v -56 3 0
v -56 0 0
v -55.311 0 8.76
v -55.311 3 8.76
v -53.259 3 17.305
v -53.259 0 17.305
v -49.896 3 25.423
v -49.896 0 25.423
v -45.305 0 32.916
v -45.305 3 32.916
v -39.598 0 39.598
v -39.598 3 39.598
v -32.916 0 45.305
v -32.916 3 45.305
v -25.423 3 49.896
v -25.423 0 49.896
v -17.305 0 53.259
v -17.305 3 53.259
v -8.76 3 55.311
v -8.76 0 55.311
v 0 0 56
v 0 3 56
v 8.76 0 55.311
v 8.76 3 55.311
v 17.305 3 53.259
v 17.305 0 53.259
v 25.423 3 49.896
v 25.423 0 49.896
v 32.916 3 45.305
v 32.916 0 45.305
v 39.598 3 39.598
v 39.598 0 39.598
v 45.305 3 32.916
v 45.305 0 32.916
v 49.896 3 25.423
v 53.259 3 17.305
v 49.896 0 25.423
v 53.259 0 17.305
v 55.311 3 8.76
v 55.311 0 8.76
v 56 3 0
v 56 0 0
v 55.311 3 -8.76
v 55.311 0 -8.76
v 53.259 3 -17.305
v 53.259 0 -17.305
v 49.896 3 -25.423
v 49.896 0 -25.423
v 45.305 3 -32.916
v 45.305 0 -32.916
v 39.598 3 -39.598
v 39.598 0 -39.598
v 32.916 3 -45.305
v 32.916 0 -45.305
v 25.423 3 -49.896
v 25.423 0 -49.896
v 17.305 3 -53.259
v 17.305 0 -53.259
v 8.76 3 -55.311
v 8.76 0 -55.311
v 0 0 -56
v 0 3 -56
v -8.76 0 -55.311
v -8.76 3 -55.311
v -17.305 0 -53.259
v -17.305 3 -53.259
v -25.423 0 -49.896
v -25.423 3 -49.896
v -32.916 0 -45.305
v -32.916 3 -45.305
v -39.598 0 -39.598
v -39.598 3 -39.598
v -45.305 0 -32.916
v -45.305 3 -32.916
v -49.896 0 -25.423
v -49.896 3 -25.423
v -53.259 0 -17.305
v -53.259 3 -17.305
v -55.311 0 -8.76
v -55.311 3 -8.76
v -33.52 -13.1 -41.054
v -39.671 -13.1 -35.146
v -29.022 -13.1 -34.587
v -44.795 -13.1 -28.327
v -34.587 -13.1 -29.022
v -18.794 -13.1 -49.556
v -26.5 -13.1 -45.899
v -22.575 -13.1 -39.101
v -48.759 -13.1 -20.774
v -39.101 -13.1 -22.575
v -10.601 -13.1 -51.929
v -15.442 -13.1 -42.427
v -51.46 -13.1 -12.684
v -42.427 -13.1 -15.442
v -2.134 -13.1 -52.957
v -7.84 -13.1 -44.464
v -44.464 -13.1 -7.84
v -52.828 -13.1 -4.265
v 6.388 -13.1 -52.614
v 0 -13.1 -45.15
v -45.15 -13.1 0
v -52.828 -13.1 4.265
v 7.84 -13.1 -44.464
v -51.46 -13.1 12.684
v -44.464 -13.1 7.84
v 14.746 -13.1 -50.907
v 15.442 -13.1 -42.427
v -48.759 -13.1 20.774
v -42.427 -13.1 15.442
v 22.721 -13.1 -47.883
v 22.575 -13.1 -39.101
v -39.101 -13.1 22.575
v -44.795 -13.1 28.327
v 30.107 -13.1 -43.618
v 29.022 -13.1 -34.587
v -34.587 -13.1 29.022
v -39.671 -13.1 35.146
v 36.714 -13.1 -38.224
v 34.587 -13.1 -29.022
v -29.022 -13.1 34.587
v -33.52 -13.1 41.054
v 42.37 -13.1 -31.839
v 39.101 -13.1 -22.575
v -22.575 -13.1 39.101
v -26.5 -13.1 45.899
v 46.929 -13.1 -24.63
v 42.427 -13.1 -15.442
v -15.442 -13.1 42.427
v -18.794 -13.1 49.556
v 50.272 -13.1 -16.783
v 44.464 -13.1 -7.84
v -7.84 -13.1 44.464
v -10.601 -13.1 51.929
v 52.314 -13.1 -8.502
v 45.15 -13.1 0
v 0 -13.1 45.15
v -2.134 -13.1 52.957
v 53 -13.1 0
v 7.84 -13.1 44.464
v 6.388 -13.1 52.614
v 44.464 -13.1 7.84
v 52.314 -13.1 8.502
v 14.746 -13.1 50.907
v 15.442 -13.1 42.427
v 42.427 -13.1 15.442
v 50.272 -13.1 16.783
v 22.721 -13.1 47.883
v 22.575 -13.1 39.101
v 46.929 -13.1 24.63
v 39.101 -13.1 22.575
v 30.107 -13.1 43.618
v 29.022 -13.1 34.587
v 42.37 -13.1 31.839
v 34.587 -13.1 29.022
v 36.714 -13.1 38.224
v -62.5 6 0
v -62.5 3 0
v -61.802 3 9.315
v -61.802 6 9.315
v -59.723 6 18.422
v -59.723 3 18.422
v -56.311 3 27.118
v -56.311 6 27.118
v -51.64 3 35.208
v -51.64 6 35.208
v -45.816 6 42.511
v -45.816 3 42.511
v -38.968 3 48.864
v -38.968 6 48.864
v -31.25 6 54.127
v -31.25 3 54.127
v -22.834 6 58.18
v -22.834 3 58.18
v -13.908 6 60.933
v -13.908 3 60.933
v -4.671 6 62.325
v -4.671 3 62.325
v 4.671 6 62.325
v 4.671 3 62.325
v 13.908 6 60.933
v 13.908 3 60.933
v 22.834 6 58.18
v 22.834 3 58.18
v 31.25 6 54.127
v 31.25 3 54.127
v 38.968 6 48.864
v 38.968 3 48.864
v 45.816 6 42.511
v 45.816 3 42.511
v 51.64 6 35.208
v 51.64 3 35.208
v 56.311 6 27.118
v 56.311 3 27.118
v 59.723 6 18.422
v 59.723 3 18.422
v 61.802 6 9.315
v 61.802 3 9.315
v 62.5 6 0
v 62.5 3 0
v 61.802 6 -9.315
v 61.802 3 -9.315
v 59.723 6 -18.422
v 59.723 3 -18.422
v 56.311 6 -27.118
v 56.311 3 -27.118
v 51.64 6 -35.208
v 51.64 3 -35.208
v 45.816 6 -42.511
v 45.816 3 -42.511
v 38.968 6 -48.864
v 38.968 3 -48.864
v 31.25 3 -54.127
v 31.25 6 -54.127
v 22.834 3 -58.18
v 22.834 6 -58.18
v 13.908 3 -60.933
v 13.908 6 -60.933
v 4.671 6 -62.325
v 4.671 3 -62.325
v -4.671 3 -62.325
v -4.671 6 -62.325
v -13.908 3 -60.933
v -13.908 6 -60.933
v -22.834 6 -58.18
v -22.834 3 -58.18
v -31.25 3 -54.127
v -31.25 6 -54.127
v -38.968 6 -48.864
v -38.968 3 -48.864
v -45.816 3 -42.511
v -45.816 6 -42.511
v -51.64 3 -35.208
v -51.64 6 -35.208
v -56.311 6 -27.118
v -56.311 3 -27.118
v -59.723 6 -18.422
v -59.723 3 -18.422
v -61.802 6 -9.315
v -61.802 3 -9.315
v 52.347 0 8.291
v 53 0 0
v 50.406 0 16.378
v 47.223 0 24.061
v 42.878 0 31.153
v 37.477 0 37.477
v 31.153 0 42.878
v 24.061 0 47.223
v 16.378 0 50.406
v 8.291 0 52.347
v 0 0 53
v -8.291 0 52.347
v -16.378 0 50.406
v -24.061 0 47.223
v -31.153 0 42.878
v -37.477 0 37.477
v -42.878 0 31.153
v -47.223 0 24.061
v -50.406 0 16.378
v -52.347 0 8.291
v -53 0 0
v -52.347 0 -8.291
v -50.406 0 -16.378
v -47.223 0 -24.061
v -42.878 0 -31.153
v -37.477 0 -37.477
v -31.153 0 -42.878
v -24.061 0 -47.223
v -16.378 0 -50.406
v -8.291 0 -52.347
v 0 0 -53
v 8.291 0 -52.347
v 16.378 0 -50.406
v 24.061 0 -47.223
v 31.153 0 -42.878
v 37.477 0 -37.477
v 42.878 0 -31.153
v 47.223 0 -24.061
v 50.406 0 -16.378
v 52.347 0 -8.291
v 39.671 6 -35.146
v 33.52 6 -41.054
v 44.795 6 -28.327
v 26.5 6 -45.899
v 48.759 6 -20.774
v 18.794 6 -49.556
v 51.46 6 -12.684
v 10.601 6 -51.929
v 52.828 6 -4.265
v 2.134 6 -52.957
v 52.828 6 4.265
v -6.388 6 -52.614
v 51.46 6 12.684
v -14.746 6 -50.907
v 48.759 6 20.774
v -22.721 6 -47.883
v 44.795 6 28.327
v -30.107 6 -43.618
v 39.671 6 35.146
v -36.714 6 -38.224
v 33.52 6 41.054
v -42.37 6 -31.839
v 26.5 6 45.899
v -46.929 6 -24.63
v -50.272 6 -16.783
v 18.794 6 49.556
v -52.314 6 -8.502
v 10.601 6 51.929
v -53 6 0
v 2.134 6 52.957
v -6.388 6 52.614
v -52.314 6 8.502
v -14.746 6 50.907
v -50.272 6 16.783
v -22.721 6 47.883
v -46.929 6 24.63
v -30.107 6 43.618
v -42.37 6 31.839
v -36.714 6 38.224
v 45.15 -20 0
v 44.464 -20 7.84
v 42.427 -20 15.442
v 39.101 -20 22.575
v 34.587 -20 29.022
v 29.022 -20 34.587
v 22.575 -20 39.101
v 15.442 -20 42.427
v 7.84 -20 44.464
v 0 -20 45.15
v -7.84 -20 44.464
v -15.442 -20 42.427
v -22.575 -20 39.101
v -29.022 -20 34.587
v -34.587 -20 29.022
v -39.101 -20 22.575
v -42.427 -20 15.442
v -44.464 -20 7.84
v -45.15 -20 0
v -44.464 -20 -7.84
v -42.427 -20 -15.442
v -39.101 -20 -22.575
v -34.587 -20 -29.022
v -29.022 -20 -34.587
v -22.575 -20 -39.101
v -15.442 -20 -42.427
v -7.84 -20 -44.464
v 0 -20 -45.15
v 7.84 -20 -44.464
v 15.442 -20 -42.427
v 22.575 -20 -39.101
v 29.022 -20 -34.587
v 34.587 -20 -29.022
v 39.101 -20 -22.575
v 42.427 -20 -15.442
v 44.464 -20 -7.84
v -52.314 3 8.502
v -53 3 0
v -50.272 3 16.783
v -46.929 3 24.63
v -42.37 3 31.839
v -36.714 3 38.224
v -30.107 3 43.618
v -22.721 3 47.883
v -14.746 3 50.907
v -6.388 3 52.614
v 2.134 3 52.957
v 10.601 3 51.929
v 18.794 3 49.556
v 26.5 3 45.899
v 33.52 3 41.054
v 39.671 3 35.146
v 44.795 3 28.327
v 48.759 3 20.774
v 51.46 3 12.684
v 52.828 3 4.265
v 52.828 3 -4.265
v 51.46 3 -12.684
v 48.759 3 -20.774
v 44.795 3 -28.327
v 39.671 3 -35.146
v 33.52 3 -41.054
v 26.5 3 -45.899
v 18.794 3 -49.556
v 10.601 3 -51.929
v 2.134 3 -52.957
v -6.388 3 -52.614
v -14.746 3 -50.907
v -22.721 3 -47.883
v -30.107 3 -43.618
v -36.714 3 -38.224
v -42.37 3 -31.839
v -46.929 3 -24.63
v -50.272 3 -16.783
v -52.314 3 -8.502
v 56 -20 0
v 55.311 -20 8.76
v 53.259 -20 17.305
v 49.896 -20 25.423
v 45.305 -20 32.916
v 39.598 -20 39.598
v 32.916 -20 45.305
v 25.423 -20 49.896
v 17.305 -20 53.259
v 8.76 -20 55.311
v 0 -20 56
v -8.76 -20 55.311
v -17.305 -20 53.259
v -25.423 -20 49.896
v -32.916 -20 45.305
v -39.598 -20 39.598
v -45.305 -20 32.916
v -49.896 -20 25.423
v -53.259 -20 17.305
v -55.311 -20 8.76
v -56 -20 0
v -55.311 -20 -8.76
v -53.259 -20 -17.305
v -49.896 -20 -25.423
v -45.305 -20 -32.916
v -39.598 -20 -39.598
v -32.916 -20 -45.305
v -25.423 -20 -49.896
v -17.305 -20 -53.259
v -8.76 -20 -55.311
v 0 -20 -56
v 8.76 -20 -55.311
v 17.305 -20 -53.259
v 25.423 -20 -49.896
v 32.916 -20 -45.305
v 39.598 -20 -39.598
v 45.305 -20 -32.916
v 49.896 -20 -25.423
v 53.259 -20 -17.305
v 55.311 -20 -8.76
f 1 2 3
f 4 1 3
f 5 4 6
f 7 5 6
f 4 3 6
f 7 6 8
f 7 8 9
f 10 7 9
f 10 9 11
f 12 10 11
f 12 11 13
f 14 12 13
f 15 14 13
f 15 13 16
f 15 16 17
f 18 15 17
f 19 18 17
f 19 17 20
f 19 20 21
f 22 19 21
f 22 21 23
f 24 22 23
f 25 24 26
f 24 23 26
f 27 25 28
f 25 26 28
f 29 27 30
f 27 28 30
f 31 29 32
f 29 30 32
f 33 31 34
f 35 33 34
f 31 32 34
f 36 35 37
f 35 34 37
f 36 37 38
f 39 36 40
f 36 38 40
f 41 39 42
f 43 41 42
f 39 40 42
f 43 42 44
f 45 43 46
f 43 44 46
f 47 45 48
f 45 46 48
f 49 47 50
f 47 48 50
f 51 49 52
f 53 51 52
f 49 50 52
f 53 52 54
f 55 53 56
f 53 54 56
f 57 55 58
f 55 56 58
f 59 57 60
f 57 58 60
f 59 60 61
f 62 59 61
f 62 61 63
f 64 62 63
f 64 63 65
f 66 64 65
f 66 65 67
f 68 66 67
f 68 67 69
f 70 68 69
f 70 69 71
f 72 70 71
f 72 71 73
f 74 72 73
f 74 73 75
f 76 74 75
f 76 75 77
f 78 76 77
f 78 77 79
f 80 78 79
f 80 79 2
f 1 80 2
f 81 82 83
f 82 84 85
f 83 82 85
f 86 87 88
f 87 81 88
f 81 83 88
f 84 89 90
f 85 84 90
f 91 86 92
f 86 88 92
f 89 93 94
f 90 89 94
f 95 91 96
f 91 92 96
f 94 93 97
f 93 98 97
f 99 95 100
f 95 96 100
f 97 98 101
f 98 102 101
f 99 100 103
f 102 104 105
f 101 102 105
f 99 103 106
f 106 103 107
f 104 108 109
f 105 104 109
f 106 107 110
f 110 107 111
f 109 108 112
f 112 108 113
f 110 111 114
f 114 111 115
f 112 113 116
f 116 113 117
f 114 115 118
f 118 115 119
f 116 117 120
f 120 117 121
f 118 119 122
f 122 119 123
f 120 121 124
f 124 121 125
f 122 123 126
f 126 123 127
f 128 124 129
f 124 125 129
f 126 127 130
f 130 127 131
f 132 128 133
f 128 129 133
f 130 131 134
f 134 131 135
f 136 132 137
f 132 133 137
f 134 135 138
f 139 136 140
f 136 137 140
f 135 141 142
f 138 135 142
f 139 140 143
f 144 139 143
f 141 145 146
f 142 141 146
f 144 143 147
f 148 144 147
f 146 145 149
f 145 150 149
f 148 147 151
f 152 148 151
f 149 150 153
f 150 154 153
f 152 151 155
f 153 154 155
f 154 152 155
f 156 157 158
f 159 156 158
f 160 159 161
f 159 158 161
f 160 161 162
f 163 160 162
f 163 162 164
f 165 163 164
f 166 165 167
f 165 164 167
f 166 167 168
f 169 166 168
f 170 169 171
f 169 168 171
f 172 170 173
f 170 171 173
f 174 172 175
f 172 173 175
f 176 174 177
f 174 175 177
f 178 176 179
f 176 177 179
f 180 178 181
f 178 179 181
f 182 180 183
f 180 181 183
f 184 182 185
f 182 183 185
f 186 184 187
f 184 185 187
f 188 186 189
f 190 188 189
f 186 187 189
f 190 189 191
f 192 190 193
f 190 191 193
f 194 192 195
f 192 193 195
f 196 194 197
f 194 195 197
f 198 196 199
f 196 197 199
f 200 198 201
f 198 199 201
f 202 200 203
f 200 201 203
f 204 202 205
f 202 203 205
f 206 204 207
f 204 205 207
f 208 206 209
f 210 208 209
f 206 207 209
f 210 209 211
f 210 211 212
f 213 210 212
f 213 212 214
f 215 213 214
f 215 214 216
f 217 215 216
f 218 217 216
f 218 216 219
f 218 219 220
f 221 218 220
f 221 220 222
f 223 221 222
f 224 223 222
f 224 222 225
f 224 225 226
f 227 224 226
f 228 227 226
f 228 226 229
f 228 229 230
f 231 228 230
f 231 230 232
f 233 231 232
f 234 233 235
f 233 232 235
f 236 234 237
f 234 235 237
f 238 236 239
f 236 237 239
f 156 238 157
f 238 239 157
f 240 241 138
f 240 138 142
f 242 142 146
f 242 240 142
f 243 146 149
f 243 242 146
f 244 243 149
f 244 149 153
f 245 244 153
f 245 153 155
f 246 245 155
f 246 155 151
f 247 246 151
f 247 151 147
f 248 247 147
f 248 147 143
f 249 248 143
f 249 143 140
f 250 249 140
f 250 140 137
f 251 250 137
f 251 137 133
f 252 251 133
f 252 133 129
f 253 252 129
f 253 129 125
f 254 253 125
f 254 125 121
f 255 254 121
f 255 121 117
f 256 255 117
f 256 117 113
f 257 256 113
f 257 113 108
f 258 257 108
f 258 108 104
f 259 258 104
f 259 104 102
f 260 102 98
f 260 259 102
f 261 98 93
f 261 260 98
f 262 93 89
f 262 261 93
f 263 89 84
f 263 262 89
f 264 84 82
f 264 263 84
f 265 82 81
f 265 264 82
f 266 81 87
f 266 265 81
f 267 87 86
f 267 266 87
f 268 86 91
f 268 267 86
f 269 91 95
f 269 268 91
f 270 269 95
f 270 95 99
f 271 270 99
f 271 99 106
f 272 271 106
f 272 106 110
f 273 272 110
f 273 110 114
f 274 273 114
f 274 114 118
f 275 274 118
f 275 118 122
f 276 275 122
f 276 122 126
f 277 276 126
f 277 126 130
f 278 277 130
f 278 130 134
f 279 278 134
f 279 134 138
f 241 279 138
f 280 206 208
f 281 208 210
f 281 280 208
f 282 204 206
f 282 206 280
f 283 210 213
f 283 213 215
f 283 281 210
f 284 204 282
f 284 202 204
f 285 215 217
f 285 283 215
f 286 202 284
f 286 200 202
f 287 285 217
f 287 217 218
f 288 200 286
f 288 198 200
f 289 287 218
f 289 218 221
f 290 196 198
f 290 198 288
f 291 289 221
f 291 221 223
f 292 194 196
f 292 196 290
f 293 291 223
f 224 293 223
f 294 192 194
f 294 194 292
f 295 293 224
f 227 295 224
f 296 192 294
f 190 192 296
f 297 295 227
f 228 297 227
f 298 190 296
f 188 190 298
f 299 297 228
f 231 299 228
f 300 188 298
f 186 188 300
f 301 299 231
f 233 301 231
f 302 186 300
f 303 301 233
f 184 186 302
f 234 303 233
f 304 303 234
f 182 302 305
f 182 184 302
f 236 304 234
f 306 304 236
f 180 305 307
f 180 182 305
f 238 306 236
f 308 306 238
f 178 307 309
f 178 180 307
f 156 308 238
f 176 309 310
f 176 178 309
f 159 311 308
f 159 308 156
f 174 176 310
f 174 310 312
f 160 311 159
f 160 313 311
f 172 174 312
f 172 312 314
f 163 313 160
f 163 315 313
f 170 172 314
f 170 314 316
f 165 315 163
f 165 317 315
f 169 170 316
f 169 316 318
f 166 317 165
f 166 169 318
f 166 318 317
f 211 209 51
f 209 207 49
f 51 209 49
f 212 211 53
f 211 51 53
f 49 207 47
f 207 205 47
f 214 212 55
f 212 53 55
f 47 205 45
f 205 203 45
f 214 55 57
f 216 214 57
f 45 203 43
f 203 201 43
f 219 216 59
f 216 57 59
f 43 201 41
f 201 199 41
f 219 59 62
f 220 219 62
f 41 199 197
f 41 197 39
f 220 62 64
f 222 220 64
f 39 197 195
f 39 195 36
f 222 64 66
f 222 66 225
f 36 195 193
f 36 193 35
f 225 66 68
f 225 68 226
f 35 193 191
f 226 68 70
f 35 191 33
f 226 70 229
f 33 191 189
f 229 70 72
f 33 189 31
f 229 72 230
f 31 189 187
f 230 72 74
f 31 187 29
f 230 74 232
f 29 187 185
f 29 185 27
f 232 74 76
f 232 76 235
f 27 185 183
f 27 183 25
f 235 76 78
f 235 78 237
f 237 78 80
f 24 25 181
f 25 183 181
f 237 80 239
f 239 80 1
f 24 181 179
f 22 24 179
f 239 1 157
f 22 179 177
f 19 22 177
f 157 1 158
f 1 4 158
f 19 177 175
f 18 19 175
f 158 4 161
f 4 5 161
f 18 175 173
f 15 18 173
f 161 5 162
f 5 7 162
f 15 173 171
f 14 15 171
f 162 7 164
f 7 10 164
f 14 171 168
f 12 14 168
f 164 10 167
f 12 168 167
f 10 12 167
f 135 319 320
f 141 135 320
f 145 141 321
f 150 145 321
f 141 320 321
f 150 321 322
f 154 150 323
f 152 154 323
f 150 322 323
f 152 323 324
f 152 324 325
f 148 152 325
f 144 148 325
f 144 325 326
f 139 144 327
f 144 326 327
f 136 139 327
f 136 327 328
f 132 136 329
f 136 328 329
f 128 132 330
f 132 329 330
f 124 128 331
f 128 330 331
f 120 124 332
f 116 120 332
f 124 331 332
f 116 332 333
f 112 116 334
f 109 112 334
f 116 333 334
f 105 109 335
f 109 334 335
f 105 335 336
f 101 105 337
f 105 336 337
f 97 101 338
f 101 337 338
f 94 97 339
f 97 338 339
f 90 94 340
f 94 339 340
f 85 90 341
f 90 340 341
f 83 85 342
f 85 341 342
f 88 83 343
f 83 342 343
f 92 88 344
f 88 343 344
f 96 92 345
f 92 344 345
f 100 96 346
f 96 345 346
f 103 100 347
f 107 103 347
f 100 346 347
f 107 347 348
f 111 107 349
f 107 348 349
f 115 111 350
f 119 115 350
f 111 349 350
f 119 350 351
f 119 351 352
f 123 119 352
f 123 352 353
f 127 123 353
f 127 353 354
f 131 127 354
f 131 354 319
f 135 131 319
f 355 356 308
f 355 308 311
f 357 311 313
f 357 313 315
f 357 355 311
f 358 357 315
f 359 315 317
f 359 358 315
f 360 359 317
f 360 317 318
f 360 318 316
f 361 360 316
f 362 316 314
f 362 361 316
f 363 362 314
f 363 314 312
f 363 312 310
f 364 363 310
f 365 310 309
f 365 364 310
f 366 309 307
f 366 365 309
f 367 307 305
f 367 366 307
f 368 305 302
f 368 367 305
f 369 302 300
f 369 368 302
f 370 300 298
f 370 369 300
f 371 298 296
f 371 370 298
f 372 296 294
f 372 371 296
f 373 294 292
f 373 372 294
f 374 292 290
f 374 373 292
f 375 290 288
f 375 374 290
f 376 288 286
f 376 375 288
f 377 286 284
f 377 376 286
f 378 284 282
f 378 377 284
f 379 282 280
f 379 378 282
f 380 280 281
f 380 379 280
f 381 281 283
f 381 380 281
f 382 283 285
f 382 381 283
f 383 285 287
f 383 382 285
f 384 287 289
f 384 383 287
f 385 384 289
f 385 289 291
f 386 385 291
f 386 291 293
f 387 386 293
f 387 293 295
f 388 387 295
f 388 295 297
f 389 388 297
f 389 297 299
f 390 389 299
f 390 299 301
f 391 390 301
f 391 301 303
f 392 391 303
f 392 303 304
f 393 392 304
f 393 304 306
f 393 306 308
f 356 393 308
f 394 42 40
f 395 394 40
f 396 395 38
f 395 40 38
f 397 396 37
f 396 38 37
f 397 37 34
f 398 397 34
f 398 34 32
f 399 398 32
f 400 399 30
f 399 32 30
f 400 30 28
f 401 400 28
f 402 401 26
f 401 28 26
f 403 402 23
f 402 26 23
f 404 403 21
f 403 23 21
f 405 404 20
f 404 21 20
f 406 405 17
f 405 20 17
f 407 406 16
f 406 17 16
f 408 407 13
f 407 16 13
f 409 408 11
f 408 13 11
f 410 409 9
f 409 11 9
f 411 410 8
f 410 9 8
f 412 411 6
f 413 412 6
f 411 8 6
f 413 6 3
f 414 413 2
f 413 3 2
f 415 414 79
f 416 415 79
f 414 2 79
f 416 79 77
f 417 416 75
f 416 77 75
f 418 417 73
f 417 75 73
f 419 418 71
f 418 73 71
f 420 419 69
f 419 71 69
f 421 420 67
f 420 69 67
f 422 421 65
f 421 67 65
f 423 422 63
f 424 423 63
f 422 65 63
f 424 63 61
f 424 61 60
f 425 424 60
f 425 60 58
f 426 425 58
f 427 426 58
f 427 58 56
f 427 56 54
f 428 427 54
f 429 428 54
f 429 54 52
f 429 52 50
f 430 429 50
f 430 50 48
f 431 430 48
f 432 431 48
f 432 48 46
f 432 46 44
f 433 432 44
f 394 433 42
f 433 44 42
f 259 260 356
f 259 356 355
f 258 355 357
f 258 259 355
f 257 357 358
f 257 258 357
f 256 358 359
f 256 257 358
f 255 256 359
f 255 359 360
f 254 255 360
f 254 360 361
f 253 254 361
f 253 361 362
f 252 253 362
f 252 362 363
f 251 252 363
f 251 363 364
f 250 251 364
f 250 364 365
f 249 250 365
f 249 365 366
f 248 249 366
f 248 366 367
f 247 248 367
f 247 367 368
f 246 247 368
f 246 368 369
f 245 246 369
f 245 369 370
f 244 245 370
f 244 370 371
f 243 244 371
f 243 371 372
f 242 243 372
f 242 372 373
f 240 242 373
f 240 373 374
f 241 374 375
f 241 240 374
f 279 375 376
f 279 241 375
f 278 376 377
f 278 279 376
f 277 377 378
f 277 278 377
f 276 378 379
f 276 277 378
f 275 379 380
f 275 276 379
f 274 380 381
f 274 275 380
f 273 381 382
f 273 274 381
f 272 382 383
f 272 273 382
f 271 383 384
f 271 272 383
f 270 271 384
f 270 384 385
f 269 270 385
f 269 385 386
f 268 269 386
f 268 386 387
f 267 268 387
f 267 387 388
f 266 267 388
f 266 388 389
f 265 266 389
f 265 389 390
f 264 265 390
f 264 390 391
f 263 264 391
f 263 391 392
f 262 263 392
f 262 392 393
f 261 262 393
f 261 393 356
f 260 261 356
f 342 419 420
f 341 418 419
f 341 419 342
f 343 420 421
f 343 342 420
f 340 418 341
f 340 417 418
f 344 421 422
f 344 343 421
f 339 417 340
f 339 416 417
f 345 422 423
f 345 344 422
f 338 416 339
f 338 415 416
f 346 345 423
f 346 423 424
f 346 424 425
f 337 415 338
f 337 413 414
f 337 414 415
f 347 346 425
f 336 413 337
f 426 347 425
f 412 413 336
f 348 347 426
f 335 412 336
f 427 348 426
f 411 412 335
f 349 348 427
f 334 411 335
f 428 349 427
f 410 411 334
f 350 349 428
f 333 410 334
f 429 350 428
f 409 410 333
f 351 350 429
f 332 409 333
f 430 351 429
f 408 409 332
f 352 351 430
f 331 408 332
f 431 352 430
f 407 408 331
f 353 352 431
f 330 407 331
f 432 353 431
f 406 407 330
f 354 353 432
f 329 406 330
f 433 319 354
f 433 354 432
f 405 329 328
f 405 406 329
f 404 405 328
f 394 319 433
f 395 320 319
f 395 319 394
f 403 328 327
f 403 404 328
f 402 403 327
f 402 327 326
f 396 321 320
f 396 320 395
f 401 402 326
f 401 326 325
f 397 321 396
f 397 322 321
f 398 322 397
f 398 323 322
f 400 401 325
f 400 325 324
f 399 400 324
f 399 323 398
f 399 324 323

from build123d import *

# Parameters (mm, degrees)
F0_R     = 56
F0_R_2   = 53
F1_DEPTH = 20
F2_R     = 56
F2_R_2   = 45.15
F3_DEPTH = 6.9
F4_R     = 56
F4_R_2   = 53
F5_DEPTH = 3
F6_R     = 62.5
F6_R_2   = 53
F7_DEPTH = 3


with BuildPart() as f1:
    # F0 (on Front) → F1 (new body)
    with BuildSketch(Plane.XZ):
        Circle(F0_R)
        Circle(F0_R_2, mode=Mode.SUBTRACT)
    extrude(amount=F1_DEPTH)

    # F2 (on face) → F3 (join)
    with BuildSketch(Plane.XZ.offset(20)):
        Circle(F2_R)
        Circle(F2_R_2, mode=Mode.SUBTRACT)
    extrude(amount=-F3_DEPTH)

    # F4 (on face) → F5 (join)
    with BuildSketch(Plane(origin=(0, 0, 0), x_dir=(-1, 0, 0), z_dir=(0, 1, 0))):
        Circle(F4_R)
        Circle(F4_R_2, mode=Mode.SUBTRACT)
    extrude(amount=F5_DEPTH)

    # F6 (on face) → F7 (join)
    with BuildSketch(Plane(origin=(0, 3, 0), x_dir=(-1, 0, 0), z_dir=(0, 1, 0))):
        Circle(F6_R)
        Circle(F6_R_2, mode=Mode.SUBTRACT)
    extrude(amount=F7_DEPTH)


solid = f1.part
